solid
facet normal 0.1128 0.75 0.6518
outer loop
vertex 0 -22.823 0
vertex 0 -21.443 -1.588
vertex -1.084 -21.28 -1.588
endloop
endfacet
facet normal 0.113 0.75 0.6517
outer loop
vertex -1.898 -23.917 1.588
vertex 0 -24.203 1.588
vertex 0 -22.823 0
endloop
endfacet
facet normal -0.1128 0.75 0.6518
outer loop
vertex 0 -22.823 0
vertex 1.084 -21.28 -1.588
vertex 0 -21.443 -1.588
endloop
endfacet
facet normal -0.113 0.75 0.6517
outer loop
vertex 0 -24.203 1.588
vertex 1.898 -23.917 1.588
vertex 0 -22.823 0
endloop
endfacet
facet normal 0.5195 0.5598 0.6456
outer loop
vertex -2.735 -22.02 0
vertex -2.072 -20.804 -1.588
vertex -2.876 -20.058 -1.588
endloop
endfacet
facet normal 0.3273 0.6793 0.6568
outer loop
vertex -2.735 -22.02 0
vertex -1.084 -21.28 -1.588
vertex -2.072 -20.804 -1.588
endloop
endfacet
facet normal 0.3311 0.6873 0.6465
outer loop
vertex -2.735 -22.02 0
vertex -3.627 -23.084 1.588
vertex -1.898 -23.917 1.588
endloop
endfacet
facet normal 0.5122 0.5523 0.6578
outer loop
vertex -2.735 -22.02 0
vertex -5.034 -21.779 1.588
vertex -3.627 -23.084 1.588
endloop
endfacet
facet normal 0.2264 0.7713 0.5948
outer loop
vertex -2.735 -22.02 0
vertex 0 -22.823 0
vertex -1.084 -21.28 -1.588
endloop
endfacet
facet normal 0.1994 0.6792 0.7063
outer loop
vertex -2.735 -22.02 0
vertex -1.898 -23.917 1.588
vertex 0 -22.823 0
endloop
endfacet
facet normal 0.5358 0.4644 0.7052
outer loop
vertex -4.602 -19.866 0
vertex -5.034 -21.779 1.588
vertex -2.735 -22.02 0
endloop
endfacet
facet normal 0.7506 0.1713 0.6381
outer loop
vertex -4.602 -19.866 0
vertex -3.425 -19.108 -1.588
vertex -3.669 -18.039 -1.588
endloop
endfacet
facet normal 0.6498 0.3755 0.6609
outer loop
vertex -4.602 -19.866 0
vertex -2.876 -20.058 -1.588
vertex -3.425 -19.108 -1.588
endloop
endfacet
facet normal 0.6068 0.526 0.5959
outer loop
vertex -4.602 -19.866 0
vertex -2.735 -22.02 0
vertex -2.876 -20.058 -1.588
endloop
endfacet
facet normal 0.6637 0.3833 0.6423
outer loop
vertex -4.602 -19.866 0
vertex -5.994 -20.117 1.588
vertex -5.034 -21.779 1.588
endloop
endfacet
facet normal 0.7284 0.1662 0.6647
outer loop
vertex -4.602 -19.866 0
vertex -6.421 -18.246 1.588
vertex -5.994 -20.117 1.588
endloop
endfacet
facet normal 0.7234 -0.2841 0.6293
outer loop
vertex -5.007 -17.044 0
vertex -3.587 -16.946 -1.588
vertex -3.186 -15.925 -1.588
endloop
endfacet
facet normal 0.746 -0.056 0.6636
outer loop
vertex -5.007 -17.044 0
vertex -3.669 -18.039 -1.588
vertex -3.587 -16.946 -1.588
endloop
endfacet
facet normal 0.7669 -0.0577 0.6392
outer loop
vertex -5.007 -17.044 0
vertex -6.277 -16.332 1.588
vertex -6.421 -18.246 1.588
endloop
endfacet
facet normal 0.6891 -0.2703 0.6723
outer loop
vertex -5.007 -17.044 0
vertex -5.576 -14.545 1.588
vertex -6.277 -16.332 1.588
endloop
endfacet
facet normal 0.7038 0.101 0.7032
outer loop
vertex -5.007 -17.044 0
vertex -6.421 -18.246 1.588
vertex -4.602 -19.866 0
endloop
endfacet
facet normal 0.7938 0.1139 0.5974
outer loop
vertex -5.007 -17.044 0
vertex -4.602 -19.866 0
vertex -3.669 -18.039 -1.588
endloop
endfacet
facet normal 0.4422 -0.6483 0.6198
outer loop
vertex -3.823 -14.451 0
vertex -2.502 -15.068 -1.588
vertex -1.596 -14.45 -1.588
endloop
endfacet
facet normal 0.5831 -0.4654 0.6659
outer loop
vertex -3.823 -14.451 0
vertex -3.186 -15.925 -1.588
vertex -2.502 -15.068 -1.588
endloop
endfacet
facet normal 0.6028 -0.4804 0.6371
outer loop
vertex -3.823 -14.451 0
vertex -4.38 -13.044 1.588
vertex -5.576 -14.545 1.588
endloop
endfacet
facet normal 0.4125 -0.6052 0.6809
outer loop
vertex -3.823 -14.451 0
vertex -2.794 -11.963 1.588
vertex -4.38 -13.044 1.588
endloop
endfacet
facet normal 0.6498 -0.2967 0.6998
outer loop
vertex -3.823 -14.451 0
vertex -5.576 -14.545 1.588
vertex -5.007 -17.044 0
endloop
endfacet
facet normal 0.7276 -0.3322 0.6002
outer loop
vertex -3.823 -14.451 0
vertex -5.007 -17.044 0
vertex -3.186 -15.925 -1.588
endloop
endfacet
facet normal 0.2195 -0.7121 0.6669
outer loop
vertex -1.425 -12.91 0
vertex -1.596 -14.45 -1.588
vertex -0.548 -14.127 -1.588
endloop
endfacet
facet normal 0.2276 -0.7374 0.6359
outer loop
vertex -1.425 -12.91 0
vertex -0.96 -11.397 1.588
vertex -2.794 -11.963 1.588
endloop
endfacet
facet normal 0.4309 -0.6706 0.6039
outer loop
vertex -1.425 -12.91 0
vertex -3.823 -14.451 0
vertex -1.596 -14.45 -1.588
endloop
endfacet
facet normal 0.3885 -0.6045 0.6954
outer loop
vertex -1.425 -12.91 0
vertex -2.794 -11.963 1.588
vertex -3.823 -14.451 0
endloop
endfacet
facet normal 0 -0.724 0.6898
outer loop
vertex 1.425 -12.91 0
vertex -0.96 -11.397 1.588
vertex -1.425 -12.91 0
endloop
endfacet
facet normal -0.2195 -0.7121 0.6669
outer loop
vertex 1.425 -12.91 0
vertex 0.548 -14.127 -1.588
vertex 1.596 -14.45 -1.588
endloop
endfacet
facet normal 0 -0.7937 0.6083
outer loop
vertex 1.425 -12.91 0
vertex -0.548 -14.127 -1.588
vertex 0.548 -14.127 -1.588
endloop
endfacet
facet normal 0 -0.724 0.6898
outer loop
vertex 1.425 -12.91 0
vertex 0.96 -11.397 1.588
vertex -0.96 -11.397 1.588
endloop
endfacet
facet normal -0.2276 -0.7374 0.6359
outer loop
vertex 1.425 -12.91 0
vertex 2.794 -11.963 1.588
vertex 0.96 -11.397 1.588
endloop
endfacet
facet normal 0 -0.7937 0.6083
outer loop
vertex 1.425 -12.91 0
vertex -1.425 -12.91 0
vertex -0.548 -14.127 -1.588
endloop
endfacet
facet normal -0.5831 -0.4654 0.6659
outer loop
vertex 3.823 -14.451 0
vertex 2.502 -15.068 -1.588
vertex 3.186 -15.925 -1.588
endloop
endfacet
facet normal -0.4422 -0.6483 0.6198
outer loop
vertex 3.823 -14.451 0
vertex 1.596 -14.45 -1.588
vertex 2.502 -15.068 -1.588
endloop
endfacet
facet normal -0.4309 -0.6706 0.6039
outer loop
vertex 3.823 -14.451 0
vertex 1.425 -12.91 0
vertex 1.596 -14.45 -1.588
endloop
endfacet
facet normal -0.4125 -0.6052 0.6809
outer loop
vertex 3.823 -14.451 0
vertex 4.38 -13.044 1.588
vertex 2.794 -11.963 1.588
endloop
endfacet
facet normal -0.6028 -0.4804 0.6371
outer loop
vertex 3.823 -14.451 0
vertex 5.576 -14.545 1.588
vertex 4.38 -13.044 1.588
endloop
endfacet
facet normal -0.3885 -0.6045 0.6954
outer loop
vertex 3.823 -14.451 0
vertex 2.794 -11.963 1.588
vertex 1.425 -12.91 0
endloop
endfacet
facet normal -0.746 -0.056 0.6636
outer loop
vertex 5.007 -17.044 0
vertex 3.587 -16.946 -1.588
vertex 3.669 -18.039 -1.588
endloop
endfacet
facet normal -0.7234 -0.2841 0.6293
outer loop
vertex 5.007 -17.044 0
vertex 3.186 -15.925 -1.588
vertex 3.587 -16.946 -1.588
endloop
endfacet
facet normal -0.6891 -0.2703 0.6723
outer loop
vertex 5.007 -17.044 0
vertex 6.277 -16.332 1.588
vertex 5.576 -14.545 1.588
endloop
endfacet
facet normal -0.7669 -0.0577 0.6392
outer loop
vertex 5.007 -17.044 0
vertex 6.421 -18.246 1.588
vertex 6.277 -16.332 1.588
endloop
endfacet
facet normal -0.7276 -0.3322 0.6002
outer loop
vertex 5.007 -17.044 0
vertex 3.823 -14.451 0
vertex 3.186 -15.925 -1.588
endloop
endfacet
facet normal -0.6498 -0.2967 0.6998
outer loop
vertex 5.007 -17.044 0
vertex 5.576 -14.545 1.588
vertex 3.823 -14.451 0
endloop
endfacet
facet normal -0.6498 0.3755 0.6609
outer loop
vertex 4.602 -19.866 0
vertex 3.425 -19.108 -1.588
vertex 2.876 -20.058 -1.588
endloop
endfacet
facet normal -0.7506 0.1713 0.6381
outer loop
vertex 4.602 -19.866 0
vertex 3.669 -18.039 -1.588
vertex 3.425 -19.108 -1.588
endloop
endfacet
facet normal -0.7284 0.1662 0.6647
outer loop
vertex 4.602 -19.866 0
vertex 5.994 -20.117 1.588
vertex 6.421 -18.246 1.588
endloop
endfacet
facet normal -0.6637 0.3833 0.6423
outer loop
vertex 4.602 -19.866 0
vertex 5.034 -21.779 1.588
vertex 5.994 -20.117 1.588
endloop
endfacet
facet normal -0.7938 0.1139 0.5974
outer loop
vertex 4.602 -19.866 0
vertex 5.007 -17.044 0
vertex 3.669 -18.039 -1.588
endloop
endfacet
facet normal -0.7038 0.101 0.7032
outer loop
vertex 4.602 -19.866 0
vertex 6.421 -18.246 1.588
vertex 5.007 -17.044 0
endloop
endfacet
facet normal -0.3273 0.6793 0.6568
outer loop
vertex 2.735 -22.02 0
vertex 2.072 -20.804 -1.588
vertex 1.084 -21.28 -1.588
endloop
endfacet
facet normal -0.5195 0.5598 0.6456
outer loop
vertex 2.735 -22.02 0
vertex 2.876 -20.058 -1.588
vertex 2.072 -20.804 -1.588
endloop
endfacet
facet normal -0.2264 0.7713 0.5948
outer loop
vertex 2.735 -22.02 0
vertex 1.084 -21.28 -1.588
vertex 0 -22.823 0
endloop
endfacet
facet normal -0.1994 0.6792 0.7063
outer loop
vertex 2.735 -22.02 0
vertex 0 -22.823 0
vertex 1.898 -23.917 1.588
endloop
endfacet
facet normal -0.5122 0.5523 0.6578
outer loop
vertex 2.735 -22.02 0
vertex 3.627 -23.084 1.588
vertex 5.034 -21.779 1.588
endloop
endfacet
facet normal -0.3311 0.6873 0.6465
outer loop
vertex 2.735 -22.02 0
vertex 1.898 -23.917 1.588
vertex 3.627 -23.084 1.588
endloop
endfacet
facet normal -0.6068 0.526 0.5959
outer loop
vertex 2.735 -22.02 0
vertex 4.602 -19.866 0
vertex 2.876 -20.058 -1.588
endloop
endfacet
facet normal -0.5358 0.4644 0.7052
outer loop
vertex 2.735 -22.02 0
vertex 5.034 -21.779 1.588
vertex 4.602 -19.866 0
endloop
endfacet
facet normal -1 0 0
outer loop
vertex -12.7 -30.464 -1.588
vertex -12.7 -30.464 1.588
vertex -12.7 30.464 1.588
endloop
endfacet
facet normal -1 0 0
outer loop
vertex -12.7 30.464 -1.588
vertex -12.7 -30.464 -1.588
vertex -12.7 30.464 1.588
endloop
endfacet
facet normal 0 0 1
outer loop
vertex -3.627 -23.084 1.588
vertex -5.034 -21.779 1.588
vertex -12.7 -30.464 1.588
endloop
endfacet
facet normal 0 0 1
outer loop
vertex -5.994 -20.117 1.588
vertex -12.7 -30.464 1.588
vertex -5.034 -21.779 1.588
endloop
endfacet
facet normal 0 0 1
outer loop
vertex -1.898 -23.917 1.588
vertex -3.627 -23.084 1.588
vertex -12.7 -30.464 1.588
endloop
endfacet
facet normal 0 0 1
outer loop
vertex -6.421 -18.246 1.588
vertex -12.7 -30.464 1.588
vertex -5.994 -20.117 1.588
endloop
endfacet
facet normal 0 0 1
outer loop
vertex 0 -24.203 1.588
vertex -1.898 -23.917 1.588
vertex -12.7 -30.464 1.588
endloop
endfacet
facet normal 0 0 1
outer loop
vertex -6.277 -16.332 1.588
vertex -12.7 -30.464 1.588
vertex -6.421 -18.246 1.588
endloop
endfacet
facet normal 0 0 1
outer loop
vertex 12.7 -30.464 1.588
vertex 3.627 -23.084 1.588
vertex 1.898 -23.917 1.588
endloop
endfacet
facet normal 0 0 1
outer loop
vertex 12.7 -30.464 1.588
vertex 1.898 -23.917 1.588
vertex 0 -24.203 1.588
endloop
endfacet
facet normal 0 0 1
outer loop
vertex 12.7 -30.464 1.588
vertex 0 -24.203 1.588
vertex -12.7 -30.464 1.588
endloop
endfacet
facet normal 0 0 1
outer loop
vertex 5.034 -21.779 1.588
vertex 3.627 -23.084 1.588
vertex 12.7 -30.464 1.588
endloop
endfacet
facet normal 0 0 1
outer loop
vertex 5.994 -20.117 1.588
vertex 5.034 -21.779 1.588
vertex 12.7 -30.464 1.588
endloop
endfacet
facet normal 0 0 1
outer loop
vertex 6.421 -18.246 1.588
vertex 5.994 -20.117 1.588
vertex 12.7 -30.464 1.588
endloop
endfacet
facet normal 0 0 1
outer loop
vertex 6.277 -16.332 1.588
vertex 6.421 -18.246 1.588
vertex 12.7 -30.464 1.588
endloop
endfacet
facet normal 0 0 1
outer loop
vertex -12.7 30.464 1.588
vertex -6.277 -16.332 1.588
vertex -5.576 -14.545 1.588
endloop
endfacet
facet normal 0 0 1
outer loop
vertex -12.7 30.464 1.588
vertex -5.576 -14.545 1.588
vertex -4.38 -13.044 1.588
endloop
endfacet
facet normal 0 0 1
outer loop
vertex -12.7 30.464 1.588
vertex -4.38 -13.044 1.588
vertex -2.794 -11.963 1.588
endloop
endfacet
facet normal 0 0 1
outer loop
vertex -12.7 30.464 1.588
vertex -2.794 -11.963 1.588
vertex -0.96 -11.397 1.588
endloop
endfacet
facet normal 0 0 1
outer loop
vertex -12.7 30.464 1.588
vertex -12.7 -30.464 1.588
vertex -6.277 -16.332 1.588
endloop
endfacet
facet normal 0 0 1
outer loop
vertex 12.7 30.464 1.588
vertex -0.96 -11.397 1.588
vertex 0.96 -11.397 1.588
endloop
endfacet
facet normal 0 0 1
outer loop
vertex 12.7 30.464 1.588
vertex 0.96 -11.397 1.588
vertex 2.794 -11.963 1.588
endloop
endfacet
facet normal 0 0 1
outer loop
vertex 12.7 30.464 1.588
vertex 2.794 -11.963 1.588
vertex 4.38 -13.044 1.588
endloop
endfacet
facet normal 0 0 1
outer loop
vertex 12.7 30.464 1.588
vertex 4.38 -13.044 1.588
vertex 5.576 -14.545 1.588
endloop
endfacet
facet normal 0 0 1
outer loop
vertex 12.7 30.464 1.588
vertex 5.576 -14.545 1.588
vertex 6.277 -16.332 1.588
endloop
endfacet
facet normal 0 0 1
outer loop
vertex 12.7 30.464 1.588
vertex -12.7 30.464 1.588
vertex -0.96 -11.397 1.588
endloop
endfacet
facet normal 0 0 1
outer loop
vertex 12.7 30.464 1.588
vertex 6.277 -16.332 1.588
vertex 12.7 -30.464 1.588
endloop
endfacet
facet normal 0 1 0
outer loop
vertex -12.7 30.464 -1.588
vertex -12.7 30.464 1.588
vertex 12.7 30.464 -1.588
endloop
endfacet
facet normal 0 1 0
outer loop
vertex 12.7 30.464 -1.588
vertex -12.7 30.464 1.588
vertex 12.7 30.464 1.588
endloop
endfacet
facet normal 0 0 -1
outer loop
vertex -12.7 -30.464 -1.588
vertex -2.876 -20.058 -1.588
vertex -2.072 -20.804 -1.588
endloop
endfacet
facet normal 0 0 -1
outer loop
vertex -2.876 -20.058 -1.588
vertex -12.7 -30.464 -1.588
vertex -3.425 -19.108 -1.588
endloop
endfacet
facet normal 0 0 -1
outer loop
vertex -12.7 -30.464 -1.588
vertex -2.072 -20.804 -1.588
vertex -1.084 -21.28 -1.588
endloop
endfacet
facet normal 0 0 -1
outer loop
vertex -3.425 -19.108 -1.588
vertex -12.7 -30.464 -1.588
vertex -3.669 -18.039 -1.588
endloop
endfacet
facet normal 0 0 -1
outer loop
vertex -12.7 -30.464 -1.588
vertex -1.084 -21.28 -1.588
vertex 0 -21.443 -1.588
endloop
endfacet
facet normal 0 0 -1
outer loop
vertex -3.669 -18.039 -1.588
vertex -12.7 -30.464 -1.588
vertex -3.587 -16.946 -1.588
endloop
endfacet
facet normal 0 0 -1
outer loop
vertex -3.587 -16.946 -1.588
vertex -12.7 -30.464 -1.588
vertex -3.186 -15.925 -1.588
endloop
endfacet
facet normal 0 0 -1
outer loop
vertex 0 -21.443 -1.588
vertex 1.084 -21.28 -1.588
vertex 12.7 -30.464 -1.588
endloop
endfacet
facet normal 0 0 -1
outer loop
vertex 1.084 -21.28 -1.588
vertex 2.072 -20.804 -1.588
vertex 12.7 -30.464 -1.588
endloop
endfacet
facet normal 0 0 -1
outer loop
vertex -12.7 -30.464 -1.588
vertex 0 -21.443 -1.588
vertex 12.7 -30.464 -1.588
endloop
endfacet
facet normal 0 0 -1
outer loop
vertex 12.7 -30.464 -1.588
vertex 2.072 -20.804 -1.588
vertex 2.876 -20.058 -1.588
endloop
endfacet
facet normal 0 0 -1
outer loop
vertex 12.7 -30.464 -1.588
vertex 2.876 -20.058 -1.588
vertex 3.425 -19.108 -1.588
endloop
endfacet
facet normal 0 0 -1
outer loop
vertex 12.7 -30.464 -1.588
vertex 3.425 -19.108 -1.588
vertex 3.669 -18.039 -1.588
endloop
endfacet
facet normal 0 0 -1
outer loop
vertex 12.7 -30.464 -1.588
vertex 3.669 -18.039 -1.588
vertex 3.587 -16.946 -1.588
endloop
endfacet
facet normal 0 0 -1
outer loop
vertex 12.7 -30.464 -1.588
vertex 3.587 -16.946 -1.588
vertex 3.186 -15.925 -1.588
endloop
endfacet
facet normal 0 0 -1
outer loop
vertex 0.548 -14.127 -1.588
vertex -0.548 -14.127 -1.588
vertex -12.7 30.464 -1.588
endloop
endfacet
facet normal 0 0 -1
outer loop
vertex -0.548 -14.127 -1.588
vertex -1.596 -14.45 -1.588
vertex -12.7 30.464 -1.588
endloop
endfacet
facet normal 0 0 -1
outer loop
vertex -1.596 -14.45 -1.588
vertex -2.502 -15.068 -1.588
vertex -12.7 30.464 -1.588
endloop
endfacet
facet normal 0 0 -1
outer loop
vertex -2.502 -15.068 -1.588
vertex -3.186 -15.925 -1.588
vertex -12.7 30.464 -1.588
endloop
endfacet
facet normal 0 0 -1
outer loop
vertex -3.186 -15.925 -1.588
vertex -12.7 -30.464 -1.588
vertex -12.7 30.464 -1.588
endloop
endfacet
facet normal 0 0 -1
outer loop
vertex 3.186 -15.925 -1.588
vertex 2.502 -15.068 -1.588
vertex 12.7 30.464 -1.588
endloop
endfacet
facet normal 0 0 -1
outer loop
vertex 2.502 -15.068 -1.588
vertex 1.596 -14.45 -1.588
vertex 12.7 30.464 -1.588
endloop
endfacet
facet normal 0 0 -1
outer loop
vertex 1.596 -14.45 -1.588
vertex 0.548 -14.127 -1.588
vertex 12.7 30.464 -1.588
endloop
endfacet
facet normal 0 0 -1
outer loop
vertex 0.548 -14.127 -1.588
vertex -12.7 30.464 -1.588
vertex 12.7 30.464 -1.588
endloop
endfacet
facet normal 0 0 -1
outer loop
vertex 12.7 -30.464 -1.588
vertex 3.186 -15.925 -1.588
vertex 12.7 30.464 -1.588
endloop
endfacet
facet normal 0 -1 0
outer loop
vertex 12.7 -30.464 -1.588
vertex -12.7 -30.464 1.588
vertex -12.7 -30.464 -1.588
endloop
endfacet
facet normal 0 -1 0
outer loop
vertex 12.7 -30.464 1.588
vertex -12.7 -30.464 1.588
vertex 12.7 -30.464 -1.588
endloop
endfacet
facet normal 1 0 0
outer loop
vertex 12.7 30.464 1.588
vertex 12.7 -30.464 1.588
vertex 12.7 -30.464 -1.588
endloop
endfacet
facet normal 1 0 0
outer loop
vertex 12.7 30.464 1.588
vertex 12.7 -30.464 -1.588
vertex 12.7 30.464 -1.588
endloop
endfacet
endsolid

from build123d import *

# Parameters (mm, degrees)
SKETCH1_W           = 25.4
SKETCH1_H           = 60.9287072
BOSS_EXTRUDE1_DEPTH = 1.5875


with BuildPart() as part:
    # Sketch1 → Boss-Extrude1 (new, symmetric)
    with BuildSketch(Plane.XY):
        Rectangle(SKETCH1_W, SKETCH1_H)
    extrude(amount=BOSS_EXTRUDE1_DEPTH, both=True)

    # Sketch3 → CSK for 1/4 Flat Head Machine Screw1 (revolve, cut)
    with BuildSketch(Plane(origin=(0, -17.7643536, 1.5875), x_dir=(0, -1, 0), z_dir=(1, 0, 0))):
        Polygon((0, 0), (0, 3.175), (3.3782, 3.175), (3.3782, 3.520932584), (6.4389, 0), align=None)
    revolve(axis=Axis((0, -17.7643536, 7.9375), (0, 0, -1)), mode=Mode.SUBTRACT)


solid = part.part
